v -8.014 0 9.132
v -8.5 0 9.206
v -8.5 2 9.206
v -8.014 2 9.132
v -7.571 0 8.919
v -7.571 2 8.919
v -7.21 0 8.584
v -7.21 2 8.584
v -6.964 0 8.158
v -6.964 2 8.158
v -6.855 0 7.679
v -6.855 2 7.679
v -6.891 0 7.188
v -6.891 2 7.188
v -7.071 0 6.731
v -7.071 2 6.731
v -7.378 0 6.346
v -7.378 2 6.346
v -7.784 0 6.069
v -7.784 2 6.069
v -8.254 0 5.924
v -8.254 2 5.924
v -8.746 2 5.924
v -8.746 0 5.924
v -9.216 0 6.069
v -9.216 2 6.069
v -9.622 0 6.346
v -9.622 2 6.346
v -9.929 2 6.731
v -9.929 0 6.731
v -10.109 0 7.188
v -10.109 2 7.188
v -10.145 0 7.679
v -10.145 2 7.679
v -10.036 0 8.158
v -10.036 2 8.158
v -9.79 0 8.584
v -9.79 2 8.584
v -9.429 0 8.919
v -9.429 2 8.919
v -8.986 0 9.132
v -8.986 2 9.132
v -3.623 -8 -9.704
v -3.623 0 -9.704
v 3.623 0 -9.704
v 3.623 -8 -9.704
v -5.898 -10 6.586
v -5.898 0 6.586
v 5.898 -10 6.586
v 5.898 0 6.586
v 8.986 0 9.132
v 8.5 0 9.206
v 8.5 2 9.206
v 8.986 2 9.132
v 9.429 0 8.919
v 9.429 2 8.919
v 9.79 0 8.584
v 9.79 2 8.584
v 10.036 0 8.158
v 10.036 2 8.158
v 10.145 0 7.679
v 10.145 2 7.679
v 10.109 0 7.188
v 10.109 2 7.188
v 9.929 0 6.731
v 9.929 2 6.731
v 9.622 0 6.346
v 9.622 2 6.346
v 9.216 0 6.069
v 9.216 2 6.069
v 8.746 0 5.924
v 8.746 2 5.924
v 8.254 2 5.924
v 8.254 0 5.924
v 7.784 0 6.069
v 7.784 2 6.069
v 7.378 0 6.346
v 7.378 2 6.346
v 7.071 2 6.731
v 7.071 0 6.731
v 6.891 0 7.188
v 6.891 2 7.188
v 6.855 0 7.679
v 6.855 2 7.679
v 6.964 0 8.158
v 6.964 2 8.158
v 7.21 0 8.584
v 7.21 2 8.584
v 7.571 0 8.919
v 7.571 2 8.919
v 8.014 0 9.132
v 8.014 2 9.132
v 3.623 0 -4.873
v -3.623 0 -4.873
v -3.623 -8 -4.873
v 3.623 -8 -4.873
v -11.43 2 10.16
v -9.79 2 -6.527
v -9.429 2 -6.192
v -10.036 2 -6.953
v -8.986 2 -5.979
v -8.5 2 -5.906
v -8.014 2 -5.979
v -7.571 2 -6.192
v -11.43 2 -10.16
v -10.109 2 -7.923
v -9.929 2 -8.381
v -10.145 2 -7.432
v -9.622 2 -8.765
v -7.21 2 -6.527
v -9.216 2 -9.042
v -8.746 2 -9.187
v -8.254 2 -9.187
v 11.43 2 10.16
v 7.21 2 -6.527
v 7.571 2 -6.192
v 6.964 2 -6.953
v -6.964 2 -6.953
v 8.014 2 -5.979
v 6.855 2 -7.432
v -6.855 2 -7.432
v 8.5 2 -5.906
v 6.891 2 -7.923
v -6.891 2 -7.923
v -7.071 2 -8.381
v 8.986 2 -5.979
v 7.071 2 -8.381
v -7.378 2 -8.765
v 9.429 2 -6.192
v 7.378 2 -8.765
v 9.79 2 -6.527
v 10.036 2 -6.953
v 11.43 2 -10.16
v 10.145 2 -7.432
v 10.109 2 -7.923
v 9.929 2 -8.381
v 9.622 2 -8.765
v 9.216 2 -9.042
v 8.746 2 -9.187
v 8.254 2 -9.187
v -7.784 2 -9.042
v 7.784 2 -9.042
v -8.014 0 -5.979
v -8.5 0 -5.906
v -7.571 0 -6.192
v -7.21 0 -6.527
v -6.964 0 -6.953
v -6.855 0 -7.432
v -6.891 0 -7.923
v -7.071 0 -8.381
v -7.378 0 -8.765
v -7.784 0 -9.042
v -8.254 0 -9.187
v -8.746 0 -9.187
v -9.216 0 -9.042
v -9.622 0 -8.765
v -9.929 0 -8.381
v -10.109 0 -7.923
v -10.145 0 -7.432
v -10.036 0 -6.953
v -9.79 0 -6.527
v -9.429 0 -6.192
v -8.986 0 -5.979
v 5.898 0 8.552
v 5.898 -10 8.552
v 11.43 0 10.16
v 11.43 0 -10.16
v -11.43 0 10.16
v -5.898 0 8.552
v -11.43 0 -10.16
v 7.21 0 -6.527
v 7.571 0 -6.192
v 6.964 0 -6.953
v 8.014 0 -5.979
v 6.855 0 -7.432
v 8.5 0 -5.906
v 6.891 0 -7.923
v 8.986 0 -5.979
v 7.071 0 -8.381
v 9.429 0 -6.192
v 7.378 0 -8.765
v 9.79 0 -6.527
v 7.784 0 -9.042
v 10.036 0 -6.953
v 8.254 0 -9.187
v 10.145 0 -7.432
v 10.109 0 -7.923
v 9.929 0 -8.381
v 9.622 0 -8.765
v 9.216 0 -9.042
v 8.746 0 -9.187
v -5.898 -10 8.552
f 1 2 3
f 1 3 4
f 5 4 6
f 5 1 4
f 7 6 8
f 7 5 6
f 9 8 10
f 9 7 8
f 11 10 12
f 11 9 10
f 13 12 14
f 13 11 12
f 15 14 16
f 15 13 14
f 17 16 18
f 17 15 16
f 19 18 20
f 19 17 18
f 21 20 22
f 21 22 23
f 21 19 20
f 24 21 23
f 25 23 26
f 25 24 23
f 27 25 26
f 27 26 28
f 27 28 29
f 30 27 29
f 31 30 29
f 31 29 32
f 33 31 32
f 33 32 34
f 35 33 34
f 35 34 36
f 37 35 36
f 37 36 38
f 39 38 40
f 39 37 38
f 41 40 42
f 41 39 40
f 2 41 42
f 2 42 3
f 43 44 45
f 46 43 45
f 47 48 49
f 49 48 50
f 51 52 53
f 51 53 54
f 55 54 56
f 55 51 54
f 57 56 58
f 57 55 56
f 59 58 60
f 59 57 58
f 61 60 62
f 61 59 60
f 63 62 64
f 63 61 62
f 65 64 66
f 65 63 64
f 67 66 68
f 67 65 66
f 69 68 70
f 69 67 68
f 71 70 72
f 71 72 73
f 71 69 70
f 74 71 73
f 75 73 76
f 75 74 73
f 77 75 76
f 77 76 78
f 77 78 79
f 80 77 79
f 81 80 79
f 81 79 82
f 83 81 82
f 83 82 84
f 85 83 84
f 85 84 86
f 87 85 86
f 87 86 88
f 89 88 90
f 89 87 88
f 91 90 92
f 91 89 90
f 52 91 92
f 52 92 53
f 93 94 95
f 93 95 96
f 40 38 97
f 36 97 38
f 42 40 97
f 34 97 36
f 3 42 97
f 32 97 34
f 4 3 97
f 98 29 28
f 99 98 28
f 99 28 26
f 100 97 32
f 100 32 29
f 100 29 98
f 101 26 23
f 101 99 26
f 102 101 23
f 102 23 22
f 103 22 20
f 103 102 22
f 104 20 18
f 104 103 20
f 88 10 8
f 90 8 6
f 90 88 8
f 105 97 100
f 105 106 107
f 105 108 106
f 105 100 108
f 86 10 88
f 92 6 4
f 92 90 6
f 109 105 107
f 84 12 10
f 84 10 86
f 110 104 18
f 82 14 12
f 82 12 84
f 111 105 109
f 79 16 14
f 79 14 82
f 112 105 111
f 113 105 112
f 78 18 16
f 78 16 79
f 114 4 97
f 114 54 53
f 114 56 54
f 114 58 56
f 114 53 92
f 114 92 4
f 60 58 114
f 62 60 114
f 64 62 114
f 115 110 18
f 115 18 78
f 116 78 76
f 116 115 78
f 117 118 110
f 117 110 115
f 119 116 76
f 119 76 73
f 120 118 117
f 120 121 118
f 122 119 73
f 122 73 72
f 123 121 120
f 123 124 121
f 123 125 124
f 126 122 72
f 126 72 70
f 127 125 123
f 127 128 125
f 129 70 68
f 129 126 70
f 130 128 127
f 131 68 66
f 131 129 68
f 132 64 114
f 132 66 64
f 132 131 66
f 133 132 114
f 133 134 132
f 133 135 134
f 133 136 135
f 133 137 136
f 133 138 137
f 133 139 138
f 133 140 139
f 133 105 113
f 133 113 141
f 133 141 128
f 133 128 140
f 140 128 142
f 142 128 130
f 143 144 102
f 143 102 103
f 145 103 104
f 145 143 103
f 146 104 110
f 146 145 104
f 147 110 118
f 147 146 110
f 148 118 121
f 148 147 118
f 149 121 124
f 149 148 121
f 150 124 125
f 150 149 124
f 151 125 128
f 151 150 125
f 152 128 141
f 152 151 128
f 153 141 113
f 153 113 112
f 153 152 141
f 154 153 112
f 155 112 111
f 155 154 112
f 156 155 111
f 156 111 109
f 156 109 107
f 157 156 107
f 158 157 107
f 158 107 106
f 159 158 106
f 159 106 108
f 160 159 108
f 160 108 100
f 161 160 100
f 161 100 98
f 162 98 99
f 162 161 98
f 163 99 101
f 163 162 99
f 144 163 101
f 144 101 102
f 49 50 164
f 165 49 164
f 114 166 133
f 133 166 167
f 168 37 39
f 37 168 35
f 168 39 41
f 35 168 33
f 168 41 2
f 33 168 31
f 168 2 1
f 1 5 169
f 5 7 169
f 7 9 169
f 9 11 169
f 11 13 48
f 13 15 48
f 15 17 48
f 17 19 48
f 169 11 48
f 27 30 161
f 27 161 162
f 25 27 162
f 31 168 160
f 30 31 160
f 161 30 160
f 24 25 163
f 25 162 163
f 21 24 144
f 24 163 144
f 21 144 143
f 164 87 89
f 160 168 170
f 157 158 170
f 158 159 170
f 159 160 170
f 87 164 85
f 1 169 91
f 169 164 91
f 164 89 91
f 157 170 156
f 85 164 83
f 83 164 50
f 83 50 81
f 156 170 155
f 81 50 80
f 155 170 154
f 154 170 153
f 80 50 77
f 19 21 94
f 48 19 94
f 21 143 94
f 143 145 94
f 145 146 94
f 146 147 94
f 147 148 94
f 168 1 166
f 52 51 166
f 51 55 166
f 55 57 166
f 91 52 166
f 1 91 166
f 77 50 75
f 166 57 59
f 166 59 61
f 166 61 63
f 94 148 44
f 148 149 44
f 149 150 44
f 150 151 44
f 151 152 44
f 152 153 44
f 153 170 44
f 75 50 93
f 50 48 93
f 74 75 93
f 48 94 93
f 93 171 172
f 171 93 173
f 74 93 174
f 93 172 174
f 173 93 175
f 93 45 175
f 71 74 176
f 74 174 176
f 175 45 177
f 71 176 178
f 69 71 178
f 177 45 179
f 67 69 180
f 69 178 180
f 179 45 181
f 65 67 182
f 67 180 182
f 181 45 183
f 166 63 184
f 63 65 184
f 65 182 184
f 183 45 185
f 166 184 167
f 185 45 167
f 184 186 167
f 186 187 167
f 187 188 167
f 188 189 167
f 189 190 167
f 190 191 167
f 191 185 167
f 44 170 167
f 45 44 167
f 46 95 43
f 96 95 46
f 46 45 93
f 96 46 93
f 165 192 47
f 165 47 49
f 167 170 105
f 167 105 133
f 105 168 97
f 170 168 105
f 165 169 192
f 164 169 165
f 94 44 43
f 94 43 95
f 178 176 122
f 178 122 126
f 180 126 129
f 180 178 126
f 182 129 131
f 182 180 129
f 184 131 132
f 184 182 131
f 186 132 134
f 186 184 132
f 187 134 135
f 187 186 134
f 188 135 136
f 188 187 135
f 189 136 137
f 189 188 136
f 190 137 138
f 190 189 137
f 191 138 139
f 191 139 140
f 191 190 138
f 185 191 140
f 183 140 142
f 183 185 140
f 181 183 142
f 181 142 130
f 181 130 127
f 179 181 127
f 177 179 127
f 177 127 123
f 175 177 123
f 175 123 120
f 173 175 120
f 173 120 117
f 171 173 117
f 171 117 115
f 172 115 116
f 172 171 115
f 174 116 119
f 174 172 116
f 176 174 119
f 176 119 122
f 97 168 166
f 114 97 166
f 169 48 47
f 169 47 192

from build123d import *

# Parameters (mm, degrees)
SKETCH1_W           = 22.86
SKETCH1_H           = 20.32
SKETCH1_R           = 1.65
BOSS_EXTRUDE1_DEPTH = 2
SKETCH2_W           = 11.796284554
SKETCH2_H           = 1.966047426
BOSS_EXTRUDE2_DEPTH = 10
SKETCH3_W           = 7.246289084
SKETCH3_H           = 4.830859388
BOSS_EXTRUDE3_DEPTH = 8


with BuildPart() as part:
    # Sketch1 → Boss-Extrude1 (new body)
    with BuildSketch(Plane(origin=(0, 0, 0), x_dir=(1, 0, 0), z_dir=(0, 1, 0))):
        Rectangle(SKETCH1_W, SKETCH1_H)
        with Locations(Location((-8.5, 7.555555556, 0), (0, 0, 270))):
            Circle(SKETCH1_R, mode=Mode.SUBTRACT)
        with Locations(Location((8.5, 7.555555556, 0), (0, 0, 270))):
            Circle(SKETCH1_R, mode=Mode.SUBTRACT)
        with Locations(Location((-8.5, -7.555555556, 0), (0, 0, 270))):
            Circle(SKETCH1_R, mode=Mode.SUBTRACT)
        with Locations(Location((8.5, -7.555555556, 0), (0, 0, 270))):
            Circle(SKETCH1_R, mode=Mode.SUBTRACT)
    extrude(amount=BOSS_EXTRUDE1_DEPTH)

    # Sketch2 → Boss-Extrude2 (add)
    with BuildSketch(Plane.XZ):
        with Locations((0, 7.569282589)):
            Rectangle(SKETCH2_W, SKETCH2_H)
    extrude(amount=BOSS_EXTRUDE2_DEPTH)

    # Sketch3 → Boss-Extrude3 (add)
    with BuildSketch(Plane.XZ):
        with Locations((0, -7.288418671)):
            Rectangle(SKETCH3_W, SKETCH3_H)
    extrude(amount=BOSS_EXTRUDE3_DEPTH)


solid = part.part
